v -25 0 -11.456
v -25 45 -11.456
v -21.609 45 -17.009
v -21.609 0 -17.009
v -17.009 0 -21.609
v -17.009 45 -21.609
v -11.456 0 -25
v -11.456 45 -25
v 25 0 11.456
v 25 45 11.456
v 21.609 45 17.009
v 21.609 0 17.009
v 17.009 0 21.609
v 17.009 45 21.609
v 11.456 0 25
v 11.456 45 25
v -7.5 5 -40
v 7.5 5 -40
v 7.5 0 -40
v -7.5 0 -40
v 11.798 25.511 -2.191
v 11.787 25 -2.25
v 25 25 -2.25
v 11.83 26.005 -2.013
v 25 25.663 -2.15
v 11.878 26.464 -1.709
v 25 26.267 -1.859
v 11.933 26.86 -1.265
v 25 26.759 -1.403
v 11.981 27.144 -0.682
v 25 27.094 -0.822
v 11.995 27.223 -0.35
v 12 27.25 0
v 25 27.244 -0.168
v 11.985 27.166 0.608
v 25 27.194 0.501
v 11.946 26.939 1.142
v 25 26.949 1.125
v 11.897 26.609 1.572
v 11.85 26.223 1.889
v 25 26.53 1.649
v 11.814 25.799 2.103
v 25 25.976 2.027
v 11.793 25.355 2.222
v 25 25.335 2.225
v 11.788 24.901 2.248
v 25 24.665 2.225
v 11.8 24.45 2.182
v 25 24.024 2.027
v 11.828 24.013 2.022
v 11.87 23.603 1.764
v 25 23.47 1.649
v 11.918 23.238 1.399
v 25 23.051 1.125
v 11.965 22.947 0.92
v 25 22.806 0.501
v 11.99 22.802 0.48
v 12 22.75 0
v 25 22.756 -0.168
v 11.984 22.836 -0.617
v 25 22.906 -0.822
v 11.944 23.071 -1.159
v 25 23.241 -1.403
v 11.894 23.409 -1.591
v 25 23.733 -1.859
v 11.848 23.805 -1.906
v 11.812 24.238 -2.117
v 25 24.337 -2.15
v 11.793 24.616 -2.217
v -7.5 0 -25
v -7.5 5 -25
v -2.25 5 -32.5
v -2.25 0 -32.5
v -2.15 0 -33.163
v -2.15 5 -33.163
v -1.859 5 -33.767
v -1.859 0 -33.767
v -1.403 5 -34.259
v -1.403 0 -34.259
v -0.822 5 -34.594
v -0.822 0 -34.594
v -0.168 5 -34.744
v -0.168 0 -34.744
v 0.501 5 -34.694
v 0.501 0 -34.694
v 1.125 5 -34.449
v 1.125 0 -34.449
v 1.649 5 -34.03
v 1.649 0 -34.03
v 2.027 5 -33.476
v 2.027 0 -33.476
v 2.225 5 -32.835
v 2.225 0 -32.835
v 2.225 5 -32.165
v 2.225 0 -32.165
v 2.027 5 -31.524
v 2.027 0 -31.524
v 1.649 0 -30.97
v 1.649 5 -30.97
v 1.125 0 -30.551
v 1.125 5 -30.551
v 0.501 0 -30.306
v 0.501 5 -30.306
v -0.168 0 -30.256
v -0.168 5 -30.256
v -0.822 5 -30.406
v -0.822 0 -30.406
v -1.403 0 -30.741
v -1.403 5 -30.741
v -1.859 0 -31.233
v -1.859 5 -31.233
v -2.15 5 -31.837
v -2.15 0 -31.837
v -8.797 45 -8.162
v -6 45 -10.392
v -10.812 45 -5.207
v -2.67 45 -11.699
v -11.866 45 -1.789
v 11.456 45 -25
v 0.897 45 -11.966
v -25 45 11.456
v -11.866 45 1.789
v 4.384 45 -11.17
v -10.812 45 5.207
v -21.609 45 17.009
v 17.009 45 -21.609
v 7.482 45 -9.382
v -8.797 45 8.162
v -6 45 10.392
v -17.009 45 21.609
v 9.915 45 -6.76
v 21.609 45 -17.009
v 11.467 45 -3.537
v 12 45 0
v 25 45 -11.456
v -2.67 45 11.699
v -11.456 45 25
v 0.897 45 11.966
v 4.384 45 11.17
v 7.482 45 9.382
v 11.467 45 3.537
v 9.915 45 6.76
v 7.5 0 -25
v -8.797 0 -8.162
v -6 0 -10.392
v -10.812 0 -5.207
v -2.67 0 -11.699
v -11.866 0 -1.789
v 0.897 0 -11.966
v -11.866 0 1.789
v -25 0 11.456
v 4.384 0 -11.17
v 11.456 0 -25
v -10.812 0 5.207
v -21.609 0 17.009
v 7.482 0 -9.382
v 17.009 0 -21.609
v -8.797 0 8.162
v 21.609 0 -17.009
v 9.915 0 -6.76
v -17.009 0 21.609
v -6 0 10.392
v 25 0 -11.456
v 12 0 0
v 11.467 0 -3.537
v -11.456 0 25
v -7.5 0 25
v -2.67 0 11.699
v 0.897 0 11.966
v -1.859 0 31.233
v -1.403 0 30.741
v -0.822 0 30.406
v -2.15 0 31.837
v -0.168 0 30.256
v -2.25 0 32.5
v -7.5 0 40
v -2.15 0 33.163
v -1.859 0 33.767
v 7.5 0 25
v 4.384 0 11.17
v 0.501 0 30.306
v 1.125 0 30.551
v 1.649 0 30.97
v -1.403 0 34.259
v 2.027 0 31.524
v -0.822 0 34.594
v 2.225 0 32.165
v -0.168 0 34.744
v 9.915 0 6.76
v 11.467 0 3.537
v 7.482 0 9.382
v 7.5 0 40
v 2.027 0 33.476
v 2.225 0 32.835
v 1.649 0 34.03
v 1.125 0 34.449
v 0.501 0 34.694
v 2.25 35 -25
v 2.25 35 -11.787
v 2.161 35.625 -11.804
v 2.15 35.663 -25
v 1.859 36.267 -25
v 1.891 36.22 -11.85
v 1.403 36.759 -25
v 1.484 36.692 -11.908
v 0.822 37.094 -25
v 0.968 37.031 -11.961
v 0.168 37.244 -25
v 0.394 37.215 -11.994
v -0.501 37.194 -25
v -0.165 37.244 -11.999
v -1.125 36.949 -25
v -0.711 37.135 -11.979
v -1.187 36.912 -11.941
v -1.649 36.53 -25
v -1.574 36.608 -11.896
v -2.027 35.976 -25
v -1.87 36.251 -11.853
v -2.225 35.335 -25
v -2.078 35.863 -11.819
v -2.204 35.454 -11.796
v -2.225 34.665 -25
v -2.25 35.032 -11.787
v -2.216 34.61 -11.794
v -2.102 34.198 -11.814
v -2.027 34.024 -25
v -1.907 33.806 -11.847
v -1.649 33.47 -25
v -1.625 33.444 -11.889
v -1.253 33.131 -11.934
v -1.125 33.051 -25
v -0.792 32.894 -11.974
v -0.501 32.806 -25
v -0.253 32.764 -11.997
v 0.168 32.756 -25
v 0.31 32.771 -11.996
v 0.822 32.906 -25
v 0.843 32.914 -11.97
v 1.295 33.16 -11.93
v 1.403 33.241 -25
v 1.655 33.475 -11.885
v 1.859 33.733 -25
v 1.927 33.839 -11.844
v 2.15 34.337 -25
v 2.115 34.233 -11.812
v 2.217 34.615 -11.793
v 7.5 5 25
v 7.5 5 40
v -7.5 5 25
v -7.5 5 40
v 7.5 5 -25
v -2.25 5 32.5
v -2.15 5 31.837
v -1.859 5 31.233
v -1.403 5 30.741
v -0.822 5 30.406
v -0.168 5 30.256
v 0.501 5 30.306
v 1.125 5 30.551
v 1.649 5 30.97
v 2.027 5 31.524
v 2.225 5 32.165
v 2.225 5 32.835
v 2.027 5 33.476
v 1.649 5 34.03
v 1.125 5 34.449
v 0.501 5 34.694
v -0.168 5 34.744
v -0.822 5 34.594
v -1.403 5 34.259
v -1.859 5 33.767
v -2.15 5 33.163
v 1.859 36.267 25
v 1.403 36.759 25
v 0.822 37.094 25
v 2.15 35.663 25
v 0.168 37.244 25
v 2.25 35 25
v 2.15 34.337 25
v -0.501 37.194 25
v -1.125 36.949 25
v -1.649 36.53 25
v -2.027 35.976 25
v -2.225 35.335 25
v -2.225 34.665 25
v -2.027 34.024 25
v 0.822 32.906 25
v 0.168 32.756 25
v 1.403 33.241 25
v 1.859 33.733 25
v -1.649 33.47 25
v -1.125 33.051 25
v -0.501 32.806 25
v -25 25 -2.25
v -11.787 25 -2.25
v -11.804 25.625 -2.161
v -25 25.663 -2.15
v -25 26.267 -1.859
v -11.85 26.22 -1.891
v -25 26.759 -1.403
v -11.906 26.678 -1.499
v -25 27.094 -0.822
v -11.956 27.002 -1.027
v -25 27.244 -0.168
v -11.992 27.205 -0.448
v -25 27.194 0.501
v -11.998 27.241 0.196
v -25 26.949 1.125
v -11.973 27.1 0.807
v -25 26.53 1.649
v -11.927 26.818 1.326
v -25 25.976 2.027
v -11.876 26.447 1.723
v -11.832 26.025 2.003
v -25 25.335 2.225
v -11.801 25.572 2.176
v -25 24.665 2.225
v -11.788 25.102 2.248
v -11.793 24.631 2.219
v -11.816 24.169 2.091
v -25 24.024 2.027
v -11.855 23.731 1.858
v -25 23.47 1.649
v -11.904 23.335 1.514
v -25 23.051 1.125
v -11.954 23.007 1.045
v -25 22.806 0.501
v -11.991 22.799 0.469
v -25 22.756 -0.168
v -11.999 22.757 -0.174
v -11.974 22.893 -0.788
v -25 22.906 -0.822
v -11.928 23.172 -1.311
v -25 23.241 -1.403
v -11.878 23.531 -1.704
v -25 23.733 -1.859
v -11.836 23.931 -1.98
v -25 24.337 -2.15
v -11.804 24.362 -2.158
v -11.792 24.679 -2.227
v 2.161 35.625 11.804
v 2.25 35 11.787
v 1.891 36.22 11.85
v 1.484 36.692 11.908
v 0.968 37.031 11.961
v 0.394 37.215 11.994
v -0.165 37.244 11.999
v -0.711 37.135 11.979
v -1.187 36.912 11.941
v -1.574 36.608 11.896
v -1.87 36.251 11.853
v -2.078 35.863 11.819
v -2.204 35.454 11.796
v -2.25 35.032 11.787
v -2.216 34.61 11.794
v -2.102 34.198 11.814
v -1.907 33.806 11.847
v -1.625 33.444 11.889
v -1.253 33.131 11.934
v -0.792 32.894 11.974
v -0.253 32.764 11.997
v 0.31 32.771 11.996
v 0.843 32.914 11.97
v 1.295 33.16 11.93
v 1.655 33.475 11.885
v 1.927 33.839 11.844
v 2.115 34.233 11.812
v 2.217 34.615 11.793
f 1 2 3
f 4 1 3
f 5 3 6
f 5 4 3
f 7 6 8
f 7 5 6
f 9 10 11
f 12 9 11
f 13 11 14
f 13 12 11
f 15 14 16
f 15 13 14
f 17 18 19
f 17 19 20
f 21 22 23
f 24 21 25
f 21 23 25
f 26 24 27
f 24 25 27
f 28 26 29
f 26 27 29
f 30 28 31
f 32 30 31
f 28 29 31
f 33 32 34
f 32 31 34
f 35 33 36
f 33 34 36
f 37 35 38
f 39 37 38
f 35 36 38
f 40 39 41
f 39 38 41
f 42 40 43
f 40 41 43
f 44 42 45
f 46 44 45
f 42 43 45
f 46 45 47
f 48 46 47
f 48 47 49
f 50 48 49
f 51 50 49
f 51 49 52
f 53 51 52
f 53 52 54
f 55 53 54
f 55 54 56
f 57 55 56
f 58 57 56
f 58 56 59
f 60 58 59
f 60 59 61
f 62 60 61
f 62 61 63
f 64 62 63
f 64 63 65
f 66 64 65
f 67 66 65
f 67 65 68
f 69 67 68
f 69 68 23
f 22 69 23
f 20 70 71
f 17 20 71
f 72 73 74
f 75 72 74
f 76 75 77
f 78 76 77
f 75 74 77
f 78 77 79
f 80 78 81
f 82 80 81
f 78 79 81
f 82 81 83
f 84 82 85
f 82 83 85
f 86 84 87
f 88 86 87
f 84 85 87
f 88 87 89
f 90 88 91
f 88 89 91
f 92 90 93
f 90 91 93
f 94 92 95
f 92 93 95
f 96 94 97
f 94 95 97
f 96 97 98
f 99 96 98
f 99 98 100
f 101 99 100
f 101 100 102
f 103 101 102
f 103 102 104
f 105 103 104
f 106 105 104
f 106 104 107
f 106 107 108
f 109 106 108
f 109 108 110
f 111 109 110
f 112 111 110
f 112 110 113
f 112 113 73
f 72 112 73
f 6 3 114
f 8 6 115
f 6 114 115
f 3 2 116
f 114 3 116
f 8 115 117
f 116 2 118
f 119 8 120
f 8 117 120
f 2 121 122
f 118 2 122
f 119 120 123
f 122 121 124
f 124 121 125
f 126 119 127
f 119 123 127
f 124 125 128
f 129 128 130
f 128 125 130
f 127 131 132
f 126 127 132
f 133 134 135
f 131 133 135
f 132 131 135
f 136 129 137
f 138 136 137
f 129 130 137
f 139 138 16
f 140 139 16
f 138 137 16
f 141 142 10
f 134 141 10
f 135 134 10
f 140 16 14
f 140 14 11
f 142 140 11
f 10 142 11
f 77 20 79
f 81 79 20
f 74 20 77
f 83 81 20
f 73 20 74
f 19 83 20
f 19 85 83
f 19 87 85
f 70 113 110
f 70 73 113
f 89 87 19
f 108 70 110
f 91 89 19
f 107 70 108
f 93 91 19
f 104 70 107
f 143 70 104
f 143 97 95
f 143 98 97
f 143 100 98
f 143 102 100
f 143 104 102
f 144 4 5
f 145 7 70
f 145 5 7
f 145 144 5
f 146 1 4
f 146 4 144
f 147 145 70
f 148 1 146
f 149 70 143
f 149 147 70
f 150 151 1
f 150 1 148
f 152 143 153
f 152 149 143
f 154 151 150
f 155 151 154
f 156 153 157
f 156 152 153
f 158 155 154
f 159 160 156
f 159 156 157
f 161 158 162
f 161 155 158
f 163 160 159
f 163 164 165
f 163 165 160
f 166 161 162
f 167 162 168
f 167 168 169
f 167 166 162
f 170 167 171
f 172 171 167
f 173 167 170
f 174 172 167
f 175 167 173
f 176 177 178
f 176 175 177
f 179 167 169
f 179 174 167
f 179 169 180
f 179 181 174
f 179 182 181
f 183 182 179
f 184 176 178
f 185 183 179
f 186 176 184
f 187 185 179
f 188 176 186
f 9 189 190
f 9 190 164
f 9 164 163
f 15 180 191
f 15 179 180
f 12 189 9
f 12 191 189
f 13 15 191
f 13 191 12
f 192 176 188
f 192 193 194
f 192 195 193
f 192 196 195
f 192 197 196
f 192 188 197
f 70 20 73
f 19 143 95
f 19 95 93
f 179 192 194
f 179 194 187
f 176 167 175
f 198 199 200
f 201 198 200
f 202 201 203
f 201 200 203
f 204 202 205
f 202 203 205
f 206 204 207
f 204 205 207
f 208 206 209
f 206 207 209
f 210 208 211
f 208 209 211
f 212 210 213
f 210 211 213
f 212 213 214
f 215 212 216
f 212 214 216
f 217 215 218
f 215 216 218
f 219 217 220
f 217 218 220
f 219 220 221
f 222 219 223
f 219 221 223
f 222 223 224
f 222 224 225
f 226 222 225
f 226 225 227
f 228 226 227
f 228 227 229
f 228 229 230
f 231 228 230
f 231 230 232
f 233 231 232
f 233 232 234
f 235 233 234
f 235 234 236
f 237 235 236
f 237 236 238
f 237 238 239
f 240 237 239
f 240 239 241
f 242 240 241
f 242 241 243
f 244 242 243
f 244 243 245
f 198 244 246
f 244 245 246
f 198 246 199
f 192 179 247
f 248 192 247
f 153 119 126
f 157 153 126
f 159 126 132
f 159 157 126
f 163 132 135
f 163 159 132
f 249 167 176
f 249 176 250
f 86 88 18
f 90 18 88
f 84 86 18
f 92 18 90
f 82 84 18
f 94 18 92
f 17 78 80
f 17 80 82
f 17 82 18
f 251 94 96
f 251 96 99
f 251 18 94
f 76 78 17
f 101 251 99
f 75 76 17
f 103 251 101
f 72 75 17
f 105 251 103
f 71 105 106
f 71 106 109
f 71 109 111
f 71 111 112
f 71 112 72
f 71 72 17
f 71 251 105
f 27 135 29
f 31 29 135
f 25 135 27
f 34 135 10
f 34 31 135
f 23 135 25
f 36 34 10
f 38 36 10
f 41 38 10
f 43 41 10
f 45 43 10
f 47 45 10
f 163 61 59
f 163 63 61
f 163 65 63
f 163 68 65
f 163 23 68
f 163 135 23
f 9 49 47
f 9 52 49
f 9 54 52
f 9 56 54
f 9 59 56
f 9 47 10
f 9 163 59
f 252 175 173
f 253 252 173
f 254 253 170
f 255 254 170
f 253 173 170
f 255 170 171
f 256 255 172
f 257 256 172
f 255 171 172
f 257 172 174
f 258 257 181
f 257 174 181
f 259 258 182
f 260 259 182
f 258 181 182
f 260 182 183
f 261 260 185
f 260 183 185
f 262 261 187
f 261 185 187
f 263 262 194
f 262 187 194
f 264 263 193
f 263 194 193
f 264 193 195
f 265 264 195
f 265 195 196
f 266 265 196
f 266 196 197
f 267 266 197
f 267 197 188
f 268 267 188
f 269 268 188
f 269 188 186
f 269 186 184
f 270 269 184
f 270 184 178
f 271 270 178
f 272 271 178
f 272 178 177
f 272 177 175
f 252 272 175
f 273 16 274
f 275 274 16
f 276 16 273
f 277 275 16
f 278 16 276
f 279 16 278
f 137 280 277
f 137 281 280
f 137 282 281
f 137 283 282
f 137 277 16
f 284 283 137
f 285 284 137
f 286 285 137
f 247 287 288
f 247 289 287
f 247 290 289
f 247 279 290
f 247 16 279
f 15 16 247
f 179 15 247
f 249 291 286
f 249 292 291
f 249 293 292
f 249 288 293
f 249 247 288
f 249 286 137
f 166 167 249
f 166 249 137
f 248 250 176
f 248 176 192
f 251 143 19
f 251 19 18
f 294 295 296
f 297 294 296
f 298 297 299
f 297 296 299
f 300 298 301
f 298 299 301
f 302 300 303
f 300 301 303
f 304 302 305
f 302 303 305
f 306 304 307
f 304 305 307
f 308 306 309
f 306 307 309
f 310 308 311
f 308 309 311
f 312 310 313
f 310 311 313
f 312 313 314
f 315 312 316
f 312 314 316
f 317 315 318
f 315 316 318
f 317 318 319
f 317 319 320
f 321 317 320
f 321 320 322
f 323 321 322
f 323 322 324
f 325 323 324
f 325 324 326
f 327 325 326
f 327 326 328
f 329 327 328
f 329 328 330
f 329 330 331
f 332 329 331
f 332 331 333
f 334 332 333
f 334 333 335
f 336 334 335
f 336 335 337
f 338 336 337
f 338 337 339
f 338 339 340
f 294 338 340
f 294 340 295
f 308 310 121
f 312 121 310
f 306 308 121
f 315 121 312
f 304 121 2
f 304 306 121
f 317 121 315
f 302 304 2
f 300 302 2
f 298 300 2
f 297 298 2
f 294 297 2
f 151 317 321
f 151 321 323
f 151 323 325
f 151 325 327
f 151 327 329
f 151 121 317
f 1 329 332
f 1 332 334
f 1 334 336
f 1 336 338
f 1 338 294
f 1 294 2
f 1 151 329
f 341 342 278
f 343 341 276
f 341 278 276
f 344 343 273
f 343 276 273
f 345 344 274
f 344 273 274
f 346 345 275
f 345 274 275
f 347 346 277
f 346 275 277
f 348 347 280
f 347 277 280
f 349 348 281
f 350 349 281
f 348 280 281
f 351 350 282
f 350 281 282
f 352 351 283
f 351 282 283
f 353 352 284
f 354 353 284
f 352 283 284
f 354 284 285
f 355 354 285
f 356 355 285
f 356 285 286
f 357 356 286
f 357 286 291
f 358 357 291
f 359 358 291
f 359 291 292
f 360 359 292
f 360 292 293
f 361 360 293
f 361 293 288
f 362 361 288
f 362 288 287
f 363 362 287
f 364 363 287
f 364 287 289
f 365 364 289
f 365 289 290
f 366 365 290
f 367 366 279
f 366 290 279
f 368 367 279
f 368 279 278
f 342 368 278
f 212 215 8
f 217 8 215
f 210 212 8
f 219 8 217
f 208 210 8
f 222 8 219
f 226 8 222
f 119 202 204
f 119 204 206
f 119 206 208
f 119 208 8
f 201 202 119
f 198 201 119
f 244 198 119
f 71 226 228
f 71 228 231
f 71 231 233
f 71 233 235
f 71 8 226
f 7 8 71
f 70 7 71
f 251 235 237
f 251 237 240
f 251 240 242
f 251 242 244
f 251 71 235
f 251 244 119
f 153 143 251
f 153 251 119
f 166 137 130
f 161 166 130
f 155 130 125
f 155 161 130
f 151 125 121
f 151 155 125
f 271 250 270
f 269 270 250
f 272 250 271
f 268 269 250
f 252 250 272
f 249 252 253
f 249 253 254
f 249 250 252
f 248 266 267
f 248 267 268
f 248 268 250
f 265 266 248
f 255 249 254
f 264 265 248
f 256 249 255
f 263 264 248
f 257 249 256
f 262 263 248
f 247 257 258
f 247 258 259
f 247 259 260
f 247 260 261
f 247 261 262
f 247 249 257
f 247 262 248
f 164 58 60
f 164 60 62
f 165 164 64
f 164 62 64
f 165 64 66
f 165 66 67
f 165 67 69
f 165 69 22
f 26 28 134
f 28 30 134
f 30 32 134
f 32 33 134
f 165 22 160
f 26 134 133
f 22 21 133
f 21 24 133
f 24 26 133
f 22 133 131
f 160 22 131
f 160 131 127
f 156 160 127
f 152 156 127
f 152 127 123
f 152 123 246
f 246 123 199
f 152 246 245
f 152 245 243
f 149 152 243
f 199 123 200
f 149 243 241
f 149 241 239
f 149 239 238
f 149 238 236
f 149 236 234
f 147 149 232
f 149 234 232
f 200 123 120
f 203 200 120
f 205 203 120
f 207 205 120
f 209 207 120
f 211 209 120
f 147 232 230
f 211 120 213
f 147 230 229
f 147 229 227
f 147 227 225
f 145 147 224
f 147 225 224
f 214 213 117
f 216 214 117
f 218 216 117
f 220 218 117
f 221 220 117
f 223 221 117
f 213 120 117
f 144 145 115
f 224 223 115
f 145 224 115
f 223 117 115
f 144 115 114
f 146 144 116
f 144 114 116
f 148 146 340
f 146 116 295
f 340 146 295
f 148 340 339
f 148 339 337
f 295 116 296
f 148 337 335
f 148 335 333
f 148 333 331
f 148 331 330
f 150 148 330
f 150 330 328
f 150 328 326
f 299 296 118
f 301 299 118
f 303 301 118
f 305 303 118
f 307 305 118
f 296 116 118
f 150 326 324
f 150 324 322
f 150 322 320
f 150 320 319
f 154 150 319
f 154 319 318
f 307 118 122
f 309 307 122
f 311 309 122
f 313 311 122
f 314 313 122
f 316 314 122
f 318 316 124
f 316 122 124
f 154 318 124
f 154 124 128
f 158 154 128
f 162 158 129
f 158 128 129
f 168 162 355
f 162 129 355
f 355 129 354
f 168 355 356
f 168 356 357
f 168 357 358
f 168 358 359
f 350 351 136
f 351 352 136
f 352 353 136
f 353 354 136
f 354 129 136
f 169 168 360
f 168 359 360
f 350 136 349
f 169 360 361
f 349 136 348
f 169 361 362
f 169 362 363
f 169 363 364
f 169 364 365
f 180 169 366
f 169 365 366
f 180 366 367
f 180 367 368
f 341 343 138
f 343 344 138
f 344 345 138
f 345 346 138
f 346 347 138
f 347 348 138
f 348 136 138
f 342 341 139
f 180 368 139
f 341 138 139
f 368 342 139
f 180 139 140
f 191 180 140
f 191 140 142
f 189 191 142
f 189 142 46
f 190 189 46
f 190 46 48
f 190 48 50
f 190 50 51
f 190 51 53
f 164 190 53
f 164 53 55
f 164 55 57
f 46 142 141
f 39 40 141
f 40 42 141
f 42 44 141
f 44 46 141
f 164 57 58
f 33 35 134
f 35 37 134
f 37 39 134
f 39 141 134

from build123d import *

# Parameters (mm, degrees)
BOSS_EXTRUDE1_DEPTH            = 45
SKETCH2_W                      = 15
SKETCH2_H                      = 5
BOSS_EXTRUDE2_DEPTH            = 15
SKETCH3_W                      = 15
SKETCH3_H                      = 5
BOSS_EXTRUDE3_DEPTH            = 15
F_24_0_24_DIAMETER_HOLE1_D     = 24
F_4_5_4_5_DIAMETER_HOLE1_D     = 4.5
F_4_5_4_5_DIAMETER_HOLE1_DEPTH = 63.212824766
F_4_5_4_5_DIAMETER_HOLE2_D     = 4.5
F_4_5_4_5_DIAMETER_HOLE2_DEPTH = 63.212824766
F_4_5_4_5_DIAMETER_HOLE3_D     = 4.5


with BuildPart() as part:
    # Sketch1 → Boss-Extrude1 (new body)
    with BuildSketch(Plane.XZ):
        with BuildLine():
            Line((-11.456439237, -25), (11.456439237, -25))
            ThreePointArc((11.456439237, -25), (19.445436483, -19.445436483), (25, -11.456439237))
            Line((25, -11.456439237), (25, 11.456439237))
            ThreePointArc((25, 11.456439237), (19.445436483, 19.445436483), (11.456439237, 25))
            Line((11.456439237, 25), (-11.456439237, 25))
            ThreePointArc((-11.456439237, 25), (-19.445436483, 19.445436483), (-25, 11.456439237))
            Line((-25, 11.456439237), (-25, -11.456439237))
            ThreePointArc((-25, -11.456439237), (-19.445436483, -19.445436483), (-11.456439237, -25))
        make_face()
    extrude(amount=-BOSS_EXTRUDE1_DEPTH)

    # Sketch2 → Boss-Extrude2 (add)
    with BuildSketch(Plane(origin=(0, 0, -25), x_dir=(-1, 0, 0), z_dir=(0, 0, -1))):
        with Locations((0, 2.5)):
            Rectangle(SKETCH2_W, SKETCH2_H)
    extrude(amount=BOSS_EXTRUDE2_DEPTH)

    # Sketch3 → Boss-Extrude3 (add)
    with BuildSketch(Plane.XY.offset(25)):
        with Locations((0, 2.5)):
            Rectangle(SKETCH3_W, SKETCH3_H)
    extrude(amount=BOSS_EXTRUDE3_DEPTH)

    # Ø24.0 (24) Diameter Hole1 (through all)
    with Locations(Plane(origin=(0, 0, 0), x_dir=(-1, 0, 0), z_dir=(0, -1, 0))):
        with Locations((0, 0)):
            Hole(F_24_0_24_DIAMETER_HOLE1_D / 2)

    # Ø4.5 (4.5) Diameter Hole1
    with Locations(Plane(origin=(0, 0, -25), x_dir=(-1, 0, 0), z_dir=(0, 0, -1))):
        with Locations((0, 35)):
            Hole(F_4_5_4_5_DIAMETER_HOLE1_D / 2, depth=F_4_5_4_5_DIAMETER_HOLE1_DEPTH)

    # Ø4.5 (4.5) Diameter Hole2
    with Locations(Plane.ZY.offset(25)):
        with Locations((0, 25)):
            Hole(F_4_5_4_5_DIAMETER_HOLE2_D / 2, depth=F_4_5_4_5_DIAMETER_HOLE2_DEPTH)

    # Ø4.5 (4.5) Diameter Hole3 (through all)
    with Locations(Plane(origin=(0, 5, 0), x_dir=(1, 0, 0), z_dir=(0, 1, 0))):
        with Locations((0, -32.5), (0, 32.5)):
            Hole(F_4_5_4_5_DIAMETER_HOLE3_D / 2)


solid = part.part
